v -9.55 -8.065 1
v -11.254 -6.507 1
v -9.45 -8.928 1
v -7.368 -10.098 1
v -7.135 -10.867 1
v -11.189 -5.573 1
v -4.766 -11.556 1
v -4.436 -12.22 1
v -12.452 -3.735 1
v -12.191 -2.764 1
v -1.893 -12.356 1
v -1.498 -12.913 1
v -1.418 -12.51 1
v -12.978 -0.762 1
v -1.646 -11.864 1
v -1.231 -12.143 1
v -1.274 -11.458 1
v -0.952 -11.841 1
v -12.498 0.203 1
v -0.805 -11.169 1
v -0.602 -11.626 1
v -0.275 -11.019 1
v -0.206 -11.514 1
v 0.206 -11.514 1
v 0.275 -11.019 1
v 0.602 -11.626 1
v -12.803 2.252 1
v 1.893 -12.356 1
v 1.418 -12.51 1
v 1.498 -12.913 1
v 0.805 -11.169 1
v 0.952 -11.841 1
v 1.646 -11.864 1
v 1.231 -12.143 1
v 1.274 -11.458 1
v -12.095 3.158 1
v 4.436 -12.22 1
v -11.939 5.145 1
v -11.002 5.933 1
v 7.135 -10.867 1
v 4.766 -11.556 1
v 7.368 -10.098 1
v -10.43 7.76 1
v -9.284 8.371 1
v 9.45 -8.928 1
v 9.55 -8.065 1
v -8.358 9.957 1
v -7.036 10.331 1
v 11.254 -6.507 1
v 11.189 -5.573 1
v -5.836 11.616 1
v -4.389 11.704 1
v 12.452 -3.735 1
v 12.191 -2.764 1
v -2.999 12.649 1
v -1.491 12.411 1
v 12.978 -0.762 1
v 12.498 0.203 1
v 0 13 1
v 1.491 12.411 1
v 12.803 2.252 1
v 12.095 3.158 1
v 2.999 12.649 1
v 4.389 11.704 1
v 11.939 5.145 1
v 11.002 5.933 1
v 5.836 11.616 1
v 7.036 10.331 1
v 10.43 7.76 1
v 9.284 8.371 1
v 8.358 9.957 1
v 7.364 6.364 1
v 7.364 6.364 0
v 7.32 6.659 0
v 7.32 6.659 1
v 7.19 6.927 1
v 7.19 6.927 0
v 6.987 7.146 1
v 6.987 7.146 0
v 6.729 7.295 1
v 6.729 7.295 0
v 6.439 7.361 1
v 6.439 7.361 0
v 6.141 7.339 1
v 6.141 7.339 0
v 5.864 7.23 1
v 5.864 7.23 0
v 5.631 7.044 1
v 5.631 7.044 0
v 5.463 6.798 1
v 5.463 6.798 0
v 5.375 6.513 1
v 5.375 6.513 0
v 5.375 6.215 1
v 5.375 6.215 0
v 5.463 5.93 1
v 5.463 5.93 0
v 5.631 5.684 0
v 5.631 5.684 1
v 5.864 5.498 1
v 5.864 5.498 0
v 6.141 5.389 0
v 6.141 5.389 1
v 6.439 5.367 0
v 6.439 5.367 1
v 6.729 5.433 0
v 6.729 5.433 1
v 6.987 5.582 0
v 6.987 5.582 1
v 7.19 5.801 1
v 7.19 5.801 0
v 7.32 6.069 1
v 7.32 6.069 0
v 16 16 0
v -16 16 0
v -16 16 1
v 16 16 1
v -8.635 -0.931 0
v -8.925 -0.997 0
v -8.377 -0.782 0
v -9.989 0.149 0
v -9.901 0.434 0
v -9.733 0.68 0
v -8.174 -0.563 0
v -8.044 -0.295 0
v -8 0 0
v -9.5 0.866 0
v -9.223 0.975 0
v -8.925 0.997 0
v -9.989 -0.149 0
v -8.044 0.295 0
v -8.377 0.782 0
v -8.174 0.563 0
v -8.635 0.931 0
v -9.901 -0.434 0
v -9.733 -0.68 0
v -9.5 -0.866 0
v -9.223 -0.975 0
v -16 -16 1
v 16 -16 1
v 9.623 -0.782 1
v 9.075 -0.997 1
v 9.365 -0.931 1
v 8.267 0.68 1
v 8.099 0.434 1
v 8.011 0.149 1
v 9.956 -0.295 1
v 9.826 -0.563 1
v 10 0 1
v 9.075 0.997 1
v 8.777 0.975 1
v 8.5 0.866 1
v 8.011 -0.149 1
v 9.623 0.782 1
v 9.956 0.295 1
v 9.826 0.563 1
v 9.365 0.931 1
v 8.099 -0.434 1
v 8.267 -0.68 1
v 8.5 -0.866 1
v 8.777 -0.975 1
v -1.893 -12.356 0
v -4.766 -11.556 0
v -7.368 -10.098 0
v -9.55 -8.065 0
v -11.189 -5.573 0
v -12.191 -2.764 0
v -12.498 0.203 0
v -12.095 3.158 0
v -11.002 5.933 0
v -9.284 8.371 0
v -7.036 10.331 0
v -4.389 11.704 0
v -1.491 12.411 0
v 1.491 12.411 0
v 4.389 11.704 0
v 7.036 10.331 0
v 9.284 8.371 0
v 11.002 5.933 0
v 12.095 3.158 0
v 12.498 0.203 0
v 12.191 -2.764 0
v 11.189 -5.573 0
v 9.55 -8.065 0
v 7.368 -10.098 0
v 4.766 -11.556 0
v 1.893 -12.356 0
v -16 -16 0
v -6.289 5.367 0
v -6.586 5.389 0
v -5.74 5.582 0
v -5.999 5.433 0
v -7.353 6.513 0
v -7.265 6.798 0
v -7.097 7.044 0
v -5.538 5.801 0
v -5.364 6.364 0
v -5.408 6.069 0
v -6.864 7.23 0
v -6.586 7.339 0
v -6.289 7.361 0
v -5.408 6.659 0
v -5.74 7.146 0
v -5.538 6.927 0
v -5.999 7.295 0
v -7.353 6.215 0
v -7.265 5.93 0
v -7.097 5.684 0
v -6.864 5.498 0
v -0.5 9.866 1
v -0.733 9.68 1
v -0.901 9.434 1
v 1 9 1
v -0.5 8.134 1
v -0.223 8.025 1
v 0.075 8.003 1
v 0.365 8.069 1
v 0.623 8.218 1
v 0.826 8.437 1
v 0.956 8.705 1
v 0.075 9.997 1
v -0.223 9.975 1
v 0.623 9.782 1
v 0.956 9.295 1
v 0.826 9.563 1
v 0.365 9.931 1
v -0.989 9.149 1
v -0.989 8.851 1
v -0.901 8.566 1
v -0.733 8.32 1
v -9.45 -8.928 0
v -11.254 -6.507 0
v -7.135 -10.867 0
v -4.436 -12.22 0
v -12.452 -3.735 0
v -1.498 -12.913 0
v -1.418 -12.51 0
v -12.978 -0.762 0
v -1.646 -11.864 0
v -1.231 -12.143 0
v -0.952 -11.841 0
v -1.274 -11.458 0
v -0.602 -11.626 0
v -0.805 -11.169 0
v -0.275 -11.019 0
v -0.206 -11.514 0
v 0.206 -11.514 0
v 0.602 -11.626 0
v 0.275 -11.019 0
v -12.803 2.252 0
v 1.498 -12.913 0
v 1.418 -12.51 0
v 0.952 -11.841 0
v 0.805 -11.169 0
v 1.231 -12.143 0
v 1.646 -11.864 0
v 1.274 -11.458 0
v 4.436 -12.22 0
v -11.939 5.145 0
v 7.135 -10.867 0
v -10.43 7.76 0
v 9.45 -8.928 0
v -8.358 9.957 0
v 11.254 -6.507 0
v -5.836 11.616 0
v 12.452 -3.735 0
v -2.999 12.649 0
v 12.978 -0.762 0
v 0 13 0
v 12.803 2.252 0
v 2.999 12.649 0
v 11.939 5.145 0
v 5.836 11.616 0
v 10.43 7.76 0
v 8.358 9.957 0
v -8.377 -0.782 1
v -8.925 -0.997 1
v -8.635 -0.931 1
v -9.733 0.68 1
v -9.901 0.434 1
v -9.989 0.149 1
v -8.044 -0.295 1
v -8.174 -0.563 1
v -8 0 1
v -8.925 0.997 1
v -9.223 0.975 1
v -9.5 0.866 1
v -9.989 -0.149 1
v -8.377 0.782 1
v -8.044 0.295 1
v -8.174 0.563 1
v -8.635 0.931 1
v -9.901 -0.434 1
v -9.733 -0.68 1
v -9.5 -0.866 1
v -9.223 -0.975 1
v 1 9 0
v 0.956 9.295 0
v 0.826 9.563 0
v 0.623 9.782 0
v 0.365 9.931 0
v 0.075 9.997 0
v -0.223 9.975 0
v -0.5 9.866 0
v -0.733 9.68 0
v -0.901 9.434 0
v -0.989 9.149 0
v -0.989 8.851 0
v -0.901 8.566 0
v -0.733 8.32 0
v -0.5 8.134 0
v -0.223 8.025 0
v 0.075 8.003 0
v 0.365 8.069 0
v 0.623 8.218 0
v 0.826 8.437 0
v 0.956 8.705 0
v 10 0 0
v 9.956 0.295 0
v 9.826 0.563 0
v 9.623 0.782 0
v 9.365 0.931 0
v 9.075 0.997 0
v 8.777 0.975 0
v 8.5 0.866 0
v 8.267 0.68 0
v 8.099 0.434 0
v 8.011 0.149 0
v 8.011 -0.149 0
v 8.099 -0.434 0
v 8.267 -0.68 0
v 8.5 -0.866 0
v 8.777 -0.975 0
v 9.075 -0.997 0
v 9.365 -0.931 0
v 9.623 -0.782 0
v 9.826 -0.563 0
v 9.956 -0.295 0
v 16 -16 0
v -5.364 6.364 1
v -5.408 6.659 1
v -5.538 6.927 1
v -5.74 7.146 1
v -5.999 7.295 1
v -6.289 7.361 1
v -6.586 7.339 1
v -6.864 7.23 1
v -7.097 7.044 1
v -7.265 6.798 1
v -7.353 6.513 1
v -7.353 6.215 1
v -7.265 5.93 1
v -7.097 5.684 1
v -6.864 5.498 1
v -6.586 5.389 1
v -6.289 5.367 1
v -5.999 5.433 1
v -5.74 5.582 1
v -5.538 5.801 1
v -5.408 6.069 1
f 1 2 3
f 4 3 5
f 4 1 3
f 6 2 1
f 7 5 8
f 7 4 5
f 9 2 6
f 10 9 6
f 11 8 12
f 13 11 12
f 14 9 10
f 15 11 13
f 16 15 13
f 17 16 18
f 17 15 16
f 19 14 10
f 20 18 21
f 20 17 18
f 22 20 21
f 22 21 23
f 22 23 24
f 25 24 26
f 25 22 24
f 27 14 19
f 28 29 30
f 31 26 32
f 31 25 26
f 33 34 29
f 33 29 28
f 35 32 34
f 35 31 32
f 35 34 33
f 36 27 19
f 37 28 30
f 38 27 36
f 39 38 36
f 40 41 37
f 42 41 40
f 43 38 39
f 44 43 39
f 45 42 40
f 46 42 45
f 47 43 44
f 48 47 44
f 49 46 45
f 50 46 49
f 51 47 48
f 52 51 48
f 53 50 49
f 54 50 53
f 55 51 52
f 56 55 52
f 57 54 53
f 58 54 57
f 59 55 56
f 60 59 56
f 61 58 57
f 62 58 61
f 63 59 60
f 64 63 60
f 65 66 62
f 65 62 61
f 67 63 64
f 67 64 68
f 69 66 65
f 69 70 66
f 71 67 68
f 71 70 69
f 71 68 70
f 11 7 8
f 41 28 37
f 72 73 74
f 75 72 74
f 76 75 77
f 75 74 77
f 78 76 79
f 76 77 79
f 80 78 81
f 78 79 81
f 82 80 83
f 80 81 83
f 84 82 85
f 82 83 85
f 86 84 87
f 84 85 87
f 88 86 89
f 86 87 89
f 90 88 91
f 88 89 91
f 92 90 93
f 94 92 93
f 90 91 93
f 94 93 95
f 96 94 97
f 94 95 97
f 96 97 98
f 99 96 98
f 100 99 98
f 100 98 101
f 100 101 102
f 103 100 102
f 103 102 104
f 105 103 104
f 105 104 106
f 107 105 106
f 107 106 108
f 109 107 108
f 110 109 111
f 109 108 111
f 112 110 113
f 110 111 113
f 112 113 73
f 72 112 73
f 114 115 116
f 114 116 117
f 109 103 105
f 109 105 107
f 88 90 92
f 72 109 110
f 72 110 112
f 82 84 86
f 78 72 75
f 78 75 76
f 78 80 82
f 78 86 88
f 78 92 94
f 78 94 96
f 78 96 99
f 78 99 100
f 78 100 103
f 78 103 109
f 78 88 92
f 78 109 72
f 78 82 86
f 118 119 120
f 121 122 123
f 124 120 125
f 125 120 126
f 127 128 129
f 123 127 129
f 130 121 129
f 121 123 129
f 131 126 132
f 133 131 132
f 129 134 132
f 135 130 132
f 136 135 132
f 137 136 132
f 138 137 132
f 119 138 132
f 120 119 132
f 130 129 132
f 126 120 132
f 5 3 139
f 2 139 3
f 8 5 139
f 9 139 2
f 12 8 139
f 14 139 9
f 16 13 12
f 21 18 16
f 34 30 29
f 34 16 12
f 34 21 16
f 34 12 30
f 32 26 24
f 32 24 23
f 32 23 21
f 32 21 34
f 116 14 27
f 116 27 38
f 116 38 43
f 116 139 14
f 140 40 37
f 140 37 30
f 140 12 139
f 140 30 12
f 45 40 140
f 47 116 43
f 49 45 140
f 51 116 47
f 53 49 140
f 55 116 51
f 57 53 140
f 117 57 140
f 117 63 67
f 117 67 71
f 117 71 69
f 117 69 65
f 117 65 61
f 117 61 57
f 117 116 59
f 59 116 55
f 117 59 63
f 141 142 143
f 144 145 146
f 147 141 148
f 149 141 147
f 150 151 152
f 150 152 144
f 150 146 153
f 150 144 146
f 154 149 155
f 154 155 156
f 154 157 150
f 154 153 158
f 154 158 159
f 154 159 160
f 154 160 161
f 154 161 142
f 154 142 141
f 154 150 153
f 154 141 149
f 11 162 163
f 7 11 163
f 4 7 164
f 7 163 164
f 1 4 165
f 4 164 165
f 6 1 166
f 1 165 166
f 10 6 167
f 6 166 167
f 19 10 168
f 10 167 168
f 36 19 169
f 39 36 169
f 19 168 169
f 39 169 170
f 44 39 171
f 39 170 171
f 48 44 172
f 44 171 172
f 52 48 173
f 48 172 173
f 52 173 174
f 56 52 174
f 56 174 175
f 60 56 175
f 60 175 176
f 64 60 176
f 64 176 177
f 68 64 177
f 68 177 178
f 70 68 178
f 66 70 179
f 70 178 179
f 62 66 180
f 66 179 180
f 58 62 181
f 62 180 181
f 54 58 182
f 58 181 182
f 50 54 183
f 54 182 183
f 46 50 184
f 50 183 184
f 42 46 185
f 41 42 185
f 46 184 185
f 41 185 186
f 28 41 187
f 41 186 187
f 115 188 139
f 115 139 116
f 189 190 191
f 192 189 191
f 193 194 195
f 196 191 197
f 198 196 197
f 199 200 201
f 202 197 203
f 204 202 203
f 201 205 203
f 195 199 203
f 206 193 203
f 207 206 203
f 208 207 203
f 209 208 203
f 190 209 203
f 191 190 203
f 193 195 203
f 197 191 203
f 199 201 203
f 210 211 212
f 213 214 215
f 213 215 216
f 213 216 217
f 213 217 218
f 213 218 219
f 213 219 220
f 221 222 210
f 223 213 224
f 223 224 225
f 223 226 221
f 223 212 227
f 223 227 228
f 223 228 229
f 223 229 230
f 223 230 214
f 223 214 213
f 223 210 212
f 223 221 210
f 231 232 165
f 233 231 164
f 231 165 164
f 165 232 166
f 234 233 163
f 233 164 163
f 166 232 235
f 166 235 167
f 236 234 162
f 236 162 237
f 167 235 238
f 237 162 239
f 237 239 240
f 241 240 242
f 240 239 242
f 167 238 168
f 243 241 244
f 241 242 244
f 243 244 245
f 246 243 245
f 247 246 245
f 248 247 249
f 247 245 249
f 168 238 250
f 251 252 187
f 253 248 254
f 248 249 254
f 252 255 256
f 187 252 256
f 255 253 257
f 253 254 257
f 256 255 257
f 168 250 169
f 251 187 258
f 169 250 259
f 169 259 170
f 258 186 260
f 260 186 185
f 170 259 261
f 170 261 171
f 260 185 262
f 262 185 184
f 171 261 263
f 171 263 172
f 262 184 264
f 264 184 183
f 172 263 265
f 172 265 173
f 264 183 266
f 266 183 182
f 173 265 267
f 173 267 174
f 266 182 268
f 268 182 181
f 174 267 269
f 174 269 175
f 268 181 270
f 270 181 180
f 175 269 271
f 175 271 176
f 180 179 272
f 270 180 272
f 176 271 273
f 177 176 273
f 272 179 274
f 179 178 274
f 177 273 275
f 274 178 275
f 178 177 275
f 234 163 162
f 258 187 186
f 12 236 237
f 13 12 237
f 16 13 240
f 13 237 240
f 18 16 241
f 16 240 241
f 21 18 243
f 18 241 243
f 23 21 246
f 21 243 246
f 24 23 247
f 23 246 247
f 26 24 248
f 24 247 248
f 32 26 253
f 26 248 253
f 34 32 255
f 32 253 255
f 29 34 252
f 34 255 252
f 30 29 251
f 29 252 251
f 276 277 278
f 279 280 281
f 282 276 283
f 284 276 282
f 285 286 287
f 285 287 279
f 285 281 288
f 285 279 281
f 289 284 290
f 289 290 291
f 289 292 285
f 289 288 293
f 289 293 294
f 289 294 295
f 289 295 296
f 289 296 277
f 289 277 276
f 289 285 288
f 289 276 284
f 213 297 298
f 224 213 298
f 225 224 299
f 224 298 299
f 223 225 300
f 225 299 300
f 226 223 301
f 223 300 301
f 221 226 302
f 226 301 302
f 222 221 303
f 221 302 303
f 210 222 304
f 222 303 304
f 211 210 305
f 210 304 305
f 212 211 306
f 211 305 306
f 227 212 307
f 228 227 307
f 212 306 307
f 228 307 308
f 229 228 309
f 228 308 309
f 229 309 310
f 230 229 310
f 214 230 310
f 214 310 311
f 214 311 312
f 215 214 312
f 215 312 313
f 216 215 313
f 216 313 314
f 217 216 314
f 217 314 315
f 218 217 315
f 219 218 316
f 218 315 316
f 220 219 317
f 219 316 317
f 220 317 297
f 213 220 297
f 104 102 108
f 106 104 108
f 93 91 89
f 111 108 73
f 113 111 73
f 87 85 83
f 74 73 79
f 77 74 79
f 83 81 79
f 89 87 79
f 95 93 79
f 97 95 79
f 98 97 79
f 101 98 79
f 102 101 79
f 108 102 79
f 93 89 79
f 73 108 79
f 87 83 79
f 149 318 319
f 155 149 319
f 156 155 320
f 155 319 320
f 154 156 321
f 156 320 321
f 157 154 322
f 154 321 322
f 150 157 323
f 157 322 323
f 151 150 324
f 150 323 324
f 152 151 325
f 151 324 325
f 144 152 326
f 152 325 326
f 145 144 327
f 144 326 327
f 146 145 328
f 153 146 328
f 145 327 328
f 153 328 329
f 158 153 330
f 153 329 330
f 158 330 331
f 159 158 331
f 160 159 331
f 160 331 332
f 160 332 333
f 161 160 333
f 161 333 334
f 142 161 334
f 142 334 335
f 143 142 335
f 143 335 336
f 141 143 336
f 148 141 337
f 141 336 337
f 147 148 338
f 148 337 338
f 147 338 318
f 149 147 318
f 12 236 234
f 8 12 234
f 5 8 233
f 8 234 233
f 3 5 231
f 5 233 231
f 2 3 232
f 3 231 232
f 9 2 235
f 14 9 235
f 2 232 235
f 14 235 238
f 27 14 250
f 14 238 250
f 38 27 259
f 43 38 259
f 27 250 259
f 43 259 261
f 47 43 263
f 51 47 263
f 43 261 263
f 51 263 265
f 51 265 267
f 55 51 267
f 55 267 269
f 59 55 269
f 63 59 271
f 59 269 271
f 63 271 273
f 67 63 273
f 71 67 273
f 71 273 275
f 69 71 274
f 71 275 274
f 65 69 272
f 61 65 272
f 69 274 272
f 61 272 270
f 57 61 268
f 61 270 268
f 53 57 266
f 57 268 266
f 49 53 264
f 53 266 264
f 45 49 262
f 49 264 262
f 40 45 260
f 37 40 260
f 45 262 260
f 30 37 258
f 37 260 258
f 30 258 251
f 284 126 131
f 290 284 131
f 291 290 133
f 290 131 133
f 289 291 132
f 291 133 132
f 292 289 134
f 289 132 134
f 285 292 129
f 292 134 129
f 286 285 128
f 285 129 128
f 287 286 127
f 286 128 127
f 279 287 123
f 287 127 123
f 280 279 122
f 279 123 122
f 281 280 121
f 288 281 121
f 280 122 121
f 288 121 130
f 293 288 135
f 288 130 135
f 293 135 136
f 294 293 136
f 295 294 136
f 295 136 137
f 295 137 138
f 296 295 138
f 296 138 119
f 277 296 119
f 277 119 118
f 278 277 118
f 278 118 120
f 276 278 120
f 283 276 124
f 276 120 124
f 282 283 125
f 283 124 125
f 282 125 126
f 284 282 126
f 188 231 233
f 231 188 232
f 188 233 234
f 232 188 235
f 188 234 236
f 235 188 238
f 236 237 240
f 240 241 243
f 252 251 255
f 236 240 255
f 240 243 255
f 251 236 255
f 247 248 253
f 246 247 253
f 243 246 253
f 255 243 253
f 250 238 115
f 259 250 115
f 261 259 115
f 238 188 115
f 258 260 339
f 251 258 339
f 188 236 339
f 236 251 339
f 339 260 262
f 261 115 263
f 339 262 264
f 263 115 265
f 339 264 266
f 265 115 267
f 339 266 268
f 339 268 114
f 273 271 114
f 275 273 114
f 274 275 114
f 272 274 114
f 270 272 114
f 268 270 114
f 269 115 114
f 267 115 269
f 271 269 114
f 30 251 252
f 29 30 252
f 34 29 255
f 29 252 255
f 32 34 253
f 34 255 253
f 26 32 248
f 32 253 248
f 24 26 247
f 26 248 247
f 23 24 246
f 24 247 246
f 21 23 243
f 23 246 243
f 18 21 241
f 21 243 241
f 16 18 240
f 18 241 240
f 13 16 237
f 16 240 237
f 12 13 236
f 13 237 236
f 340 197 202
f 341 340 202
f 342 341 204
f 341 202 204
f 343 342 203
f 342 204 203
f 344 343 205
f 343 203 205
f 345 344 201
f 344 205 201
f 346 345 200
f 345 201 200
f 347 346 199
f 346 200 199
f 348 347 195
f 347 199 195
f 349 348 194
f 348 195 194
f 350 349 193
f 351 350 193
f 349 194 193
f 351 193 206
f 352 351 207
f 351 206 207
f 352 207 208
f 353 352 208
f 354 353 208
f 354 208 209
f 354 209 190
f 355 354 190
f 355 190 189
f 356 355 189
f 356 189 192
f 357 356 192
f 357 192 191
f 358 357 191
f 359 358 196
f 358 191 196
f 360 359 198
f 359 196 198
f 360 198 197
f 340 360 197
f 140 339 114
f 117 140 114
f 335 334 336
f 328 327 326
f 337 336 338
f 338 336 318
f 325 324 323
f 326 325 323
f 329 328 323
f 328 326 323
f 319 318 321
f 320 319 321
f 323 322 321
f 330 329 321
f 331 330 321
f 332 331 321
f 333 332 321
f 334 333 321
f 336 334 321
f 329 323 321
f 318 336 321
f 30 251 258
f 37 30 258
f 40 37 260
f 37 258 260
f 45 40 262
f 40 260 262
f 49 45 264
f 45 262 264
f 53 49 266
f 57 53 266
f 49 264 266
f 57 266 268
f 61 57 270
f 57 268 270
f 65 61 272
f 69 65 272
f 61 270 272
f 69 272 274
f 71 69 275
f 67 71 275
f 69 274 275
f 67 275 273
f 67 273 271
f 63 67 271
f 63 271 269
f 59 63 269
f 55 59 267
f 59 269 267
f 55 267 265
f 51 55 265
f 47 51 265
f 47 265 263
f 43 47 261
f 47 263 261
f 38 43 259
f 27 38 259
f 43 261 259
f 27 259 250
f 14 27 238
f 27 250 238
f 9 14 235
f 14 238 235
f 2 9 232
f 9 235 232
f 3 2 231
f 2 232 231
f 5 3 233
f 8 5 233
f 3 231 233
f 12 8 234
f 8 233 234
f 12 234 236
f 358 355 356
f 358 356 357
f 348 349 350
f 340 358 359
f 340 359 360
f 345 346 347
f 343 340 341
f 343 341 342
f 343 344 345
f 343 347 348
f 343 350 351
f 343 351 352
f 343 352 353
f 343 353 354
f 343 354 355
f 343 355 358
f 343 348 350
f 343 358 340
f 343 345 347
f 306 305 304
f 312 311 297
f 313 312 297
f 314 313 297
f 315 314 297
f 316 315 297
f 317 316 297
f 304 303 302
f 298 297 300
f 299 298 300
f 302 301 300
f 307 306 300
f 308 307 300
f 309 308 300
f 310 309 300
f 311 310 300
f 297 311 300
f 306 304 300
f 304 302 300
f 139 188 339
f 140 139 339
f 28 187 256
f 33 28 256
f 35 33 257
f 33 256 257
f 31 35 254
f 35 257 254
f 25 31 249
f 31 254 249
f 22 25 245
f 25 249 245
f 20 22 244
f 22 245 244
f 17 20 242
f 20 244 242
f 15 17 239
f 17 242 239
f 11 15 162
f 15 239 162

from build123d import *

# Parameters (mm, degrees)
F0_R     = 1
F1_DEPTH = 1
F0_W     = 32
F0_H     = 32
F2_DEPTH = 1


with BuildPart() as f1:
    # F0 (on Top) → F1 (new body)
    with BuildSketch(Plane.XY):
        with Locations((-6.3639610307, 6.3639610307)):
            Circle(F0_R)
    extrude(amount=F1_DEPTH)


with BuildPart() as f1b:
    # F0 (on Top) → F1, piece 2 (new body)
    with BuildSketch(Plane.XY):
        with Locations((-9, 0)):
            Circle(F0_R)
    extrude(amount=F1_DEPTH)


with BuildPart() as f1c:
    # F0 (on Top) → F1, piece 3 (new body)
    with BuildSketch(Plane.XY):
        with Locations((0, 9)):
            Circle(F0_R)
    extrude(amount=F1_DEPTH)


with BuildPart() as f1d:
    # F0 (on Top) → F1, piece 4 (new body)
    with BuildSketch(Plane.XY):
        with Locations((6.3639610307, 6.3639610307)):
            Circle(F0_R)
    extrude(amount=F1_DEPTH)


with BuildPart() as f1e:
    # F0 (on Top) → F1, piece 5 (new body)
    with BuildSketch(Plane.XY):
        with Locations((9, 0)):
            Circle(F0_R)
    extrude(amount=F1_DEPTH)


with BuildPart() as f1f:
    # F0 (on Top) → F1, piece 6 (new body)
    with BuildSketch(Plane.XY):
        with BuildLine():
            ThreePointArc((-1.4975016176, -12.9134615385), (0, -11.5), (1.4975016176, -12.9134615385))
            ThreePointArc((1.4975016176, -12.9134615385), (0, 13), (-1.4975016176, -12.9134615385))
        make_face()
        with BuildLine():
            ThreePointArc((-1.8934008334, -12.3557692308), (0, 12.5), (1.8934008334, -12.3557692308))
            ThreePointArc((1.8934008334, -12.3557692308), (0, -11), (-1.8934008334, -12.3557692308))
        make_face(mode=Mode.SUBTRACT)
    extrude(amount=F1_DEPTH)


with BuildPart() as f2:
    # F0 (on Top) → F2 (new body)
    with BuildSketch(Plane.XY):
        Rectangle(F0_W, F0_H)
        with BuildLine():
            ThreePointArc((-1.4975016176, -12.9134615385), (0, 13), (1.4975016176, -12.9134615385))
            ThreePointArc((1.4975016176, -12.9134615385), (0, -11.5), (-1.4975016176, -12.9134615385))
        make_face(mode=Mode.SUBTRACT)
    extrude(amount=F2_DEPTH)


solid = Compound([f1.part, f1b.part, f1c.part, f1d.part, f1e.part, f1f.part, f2.part])
